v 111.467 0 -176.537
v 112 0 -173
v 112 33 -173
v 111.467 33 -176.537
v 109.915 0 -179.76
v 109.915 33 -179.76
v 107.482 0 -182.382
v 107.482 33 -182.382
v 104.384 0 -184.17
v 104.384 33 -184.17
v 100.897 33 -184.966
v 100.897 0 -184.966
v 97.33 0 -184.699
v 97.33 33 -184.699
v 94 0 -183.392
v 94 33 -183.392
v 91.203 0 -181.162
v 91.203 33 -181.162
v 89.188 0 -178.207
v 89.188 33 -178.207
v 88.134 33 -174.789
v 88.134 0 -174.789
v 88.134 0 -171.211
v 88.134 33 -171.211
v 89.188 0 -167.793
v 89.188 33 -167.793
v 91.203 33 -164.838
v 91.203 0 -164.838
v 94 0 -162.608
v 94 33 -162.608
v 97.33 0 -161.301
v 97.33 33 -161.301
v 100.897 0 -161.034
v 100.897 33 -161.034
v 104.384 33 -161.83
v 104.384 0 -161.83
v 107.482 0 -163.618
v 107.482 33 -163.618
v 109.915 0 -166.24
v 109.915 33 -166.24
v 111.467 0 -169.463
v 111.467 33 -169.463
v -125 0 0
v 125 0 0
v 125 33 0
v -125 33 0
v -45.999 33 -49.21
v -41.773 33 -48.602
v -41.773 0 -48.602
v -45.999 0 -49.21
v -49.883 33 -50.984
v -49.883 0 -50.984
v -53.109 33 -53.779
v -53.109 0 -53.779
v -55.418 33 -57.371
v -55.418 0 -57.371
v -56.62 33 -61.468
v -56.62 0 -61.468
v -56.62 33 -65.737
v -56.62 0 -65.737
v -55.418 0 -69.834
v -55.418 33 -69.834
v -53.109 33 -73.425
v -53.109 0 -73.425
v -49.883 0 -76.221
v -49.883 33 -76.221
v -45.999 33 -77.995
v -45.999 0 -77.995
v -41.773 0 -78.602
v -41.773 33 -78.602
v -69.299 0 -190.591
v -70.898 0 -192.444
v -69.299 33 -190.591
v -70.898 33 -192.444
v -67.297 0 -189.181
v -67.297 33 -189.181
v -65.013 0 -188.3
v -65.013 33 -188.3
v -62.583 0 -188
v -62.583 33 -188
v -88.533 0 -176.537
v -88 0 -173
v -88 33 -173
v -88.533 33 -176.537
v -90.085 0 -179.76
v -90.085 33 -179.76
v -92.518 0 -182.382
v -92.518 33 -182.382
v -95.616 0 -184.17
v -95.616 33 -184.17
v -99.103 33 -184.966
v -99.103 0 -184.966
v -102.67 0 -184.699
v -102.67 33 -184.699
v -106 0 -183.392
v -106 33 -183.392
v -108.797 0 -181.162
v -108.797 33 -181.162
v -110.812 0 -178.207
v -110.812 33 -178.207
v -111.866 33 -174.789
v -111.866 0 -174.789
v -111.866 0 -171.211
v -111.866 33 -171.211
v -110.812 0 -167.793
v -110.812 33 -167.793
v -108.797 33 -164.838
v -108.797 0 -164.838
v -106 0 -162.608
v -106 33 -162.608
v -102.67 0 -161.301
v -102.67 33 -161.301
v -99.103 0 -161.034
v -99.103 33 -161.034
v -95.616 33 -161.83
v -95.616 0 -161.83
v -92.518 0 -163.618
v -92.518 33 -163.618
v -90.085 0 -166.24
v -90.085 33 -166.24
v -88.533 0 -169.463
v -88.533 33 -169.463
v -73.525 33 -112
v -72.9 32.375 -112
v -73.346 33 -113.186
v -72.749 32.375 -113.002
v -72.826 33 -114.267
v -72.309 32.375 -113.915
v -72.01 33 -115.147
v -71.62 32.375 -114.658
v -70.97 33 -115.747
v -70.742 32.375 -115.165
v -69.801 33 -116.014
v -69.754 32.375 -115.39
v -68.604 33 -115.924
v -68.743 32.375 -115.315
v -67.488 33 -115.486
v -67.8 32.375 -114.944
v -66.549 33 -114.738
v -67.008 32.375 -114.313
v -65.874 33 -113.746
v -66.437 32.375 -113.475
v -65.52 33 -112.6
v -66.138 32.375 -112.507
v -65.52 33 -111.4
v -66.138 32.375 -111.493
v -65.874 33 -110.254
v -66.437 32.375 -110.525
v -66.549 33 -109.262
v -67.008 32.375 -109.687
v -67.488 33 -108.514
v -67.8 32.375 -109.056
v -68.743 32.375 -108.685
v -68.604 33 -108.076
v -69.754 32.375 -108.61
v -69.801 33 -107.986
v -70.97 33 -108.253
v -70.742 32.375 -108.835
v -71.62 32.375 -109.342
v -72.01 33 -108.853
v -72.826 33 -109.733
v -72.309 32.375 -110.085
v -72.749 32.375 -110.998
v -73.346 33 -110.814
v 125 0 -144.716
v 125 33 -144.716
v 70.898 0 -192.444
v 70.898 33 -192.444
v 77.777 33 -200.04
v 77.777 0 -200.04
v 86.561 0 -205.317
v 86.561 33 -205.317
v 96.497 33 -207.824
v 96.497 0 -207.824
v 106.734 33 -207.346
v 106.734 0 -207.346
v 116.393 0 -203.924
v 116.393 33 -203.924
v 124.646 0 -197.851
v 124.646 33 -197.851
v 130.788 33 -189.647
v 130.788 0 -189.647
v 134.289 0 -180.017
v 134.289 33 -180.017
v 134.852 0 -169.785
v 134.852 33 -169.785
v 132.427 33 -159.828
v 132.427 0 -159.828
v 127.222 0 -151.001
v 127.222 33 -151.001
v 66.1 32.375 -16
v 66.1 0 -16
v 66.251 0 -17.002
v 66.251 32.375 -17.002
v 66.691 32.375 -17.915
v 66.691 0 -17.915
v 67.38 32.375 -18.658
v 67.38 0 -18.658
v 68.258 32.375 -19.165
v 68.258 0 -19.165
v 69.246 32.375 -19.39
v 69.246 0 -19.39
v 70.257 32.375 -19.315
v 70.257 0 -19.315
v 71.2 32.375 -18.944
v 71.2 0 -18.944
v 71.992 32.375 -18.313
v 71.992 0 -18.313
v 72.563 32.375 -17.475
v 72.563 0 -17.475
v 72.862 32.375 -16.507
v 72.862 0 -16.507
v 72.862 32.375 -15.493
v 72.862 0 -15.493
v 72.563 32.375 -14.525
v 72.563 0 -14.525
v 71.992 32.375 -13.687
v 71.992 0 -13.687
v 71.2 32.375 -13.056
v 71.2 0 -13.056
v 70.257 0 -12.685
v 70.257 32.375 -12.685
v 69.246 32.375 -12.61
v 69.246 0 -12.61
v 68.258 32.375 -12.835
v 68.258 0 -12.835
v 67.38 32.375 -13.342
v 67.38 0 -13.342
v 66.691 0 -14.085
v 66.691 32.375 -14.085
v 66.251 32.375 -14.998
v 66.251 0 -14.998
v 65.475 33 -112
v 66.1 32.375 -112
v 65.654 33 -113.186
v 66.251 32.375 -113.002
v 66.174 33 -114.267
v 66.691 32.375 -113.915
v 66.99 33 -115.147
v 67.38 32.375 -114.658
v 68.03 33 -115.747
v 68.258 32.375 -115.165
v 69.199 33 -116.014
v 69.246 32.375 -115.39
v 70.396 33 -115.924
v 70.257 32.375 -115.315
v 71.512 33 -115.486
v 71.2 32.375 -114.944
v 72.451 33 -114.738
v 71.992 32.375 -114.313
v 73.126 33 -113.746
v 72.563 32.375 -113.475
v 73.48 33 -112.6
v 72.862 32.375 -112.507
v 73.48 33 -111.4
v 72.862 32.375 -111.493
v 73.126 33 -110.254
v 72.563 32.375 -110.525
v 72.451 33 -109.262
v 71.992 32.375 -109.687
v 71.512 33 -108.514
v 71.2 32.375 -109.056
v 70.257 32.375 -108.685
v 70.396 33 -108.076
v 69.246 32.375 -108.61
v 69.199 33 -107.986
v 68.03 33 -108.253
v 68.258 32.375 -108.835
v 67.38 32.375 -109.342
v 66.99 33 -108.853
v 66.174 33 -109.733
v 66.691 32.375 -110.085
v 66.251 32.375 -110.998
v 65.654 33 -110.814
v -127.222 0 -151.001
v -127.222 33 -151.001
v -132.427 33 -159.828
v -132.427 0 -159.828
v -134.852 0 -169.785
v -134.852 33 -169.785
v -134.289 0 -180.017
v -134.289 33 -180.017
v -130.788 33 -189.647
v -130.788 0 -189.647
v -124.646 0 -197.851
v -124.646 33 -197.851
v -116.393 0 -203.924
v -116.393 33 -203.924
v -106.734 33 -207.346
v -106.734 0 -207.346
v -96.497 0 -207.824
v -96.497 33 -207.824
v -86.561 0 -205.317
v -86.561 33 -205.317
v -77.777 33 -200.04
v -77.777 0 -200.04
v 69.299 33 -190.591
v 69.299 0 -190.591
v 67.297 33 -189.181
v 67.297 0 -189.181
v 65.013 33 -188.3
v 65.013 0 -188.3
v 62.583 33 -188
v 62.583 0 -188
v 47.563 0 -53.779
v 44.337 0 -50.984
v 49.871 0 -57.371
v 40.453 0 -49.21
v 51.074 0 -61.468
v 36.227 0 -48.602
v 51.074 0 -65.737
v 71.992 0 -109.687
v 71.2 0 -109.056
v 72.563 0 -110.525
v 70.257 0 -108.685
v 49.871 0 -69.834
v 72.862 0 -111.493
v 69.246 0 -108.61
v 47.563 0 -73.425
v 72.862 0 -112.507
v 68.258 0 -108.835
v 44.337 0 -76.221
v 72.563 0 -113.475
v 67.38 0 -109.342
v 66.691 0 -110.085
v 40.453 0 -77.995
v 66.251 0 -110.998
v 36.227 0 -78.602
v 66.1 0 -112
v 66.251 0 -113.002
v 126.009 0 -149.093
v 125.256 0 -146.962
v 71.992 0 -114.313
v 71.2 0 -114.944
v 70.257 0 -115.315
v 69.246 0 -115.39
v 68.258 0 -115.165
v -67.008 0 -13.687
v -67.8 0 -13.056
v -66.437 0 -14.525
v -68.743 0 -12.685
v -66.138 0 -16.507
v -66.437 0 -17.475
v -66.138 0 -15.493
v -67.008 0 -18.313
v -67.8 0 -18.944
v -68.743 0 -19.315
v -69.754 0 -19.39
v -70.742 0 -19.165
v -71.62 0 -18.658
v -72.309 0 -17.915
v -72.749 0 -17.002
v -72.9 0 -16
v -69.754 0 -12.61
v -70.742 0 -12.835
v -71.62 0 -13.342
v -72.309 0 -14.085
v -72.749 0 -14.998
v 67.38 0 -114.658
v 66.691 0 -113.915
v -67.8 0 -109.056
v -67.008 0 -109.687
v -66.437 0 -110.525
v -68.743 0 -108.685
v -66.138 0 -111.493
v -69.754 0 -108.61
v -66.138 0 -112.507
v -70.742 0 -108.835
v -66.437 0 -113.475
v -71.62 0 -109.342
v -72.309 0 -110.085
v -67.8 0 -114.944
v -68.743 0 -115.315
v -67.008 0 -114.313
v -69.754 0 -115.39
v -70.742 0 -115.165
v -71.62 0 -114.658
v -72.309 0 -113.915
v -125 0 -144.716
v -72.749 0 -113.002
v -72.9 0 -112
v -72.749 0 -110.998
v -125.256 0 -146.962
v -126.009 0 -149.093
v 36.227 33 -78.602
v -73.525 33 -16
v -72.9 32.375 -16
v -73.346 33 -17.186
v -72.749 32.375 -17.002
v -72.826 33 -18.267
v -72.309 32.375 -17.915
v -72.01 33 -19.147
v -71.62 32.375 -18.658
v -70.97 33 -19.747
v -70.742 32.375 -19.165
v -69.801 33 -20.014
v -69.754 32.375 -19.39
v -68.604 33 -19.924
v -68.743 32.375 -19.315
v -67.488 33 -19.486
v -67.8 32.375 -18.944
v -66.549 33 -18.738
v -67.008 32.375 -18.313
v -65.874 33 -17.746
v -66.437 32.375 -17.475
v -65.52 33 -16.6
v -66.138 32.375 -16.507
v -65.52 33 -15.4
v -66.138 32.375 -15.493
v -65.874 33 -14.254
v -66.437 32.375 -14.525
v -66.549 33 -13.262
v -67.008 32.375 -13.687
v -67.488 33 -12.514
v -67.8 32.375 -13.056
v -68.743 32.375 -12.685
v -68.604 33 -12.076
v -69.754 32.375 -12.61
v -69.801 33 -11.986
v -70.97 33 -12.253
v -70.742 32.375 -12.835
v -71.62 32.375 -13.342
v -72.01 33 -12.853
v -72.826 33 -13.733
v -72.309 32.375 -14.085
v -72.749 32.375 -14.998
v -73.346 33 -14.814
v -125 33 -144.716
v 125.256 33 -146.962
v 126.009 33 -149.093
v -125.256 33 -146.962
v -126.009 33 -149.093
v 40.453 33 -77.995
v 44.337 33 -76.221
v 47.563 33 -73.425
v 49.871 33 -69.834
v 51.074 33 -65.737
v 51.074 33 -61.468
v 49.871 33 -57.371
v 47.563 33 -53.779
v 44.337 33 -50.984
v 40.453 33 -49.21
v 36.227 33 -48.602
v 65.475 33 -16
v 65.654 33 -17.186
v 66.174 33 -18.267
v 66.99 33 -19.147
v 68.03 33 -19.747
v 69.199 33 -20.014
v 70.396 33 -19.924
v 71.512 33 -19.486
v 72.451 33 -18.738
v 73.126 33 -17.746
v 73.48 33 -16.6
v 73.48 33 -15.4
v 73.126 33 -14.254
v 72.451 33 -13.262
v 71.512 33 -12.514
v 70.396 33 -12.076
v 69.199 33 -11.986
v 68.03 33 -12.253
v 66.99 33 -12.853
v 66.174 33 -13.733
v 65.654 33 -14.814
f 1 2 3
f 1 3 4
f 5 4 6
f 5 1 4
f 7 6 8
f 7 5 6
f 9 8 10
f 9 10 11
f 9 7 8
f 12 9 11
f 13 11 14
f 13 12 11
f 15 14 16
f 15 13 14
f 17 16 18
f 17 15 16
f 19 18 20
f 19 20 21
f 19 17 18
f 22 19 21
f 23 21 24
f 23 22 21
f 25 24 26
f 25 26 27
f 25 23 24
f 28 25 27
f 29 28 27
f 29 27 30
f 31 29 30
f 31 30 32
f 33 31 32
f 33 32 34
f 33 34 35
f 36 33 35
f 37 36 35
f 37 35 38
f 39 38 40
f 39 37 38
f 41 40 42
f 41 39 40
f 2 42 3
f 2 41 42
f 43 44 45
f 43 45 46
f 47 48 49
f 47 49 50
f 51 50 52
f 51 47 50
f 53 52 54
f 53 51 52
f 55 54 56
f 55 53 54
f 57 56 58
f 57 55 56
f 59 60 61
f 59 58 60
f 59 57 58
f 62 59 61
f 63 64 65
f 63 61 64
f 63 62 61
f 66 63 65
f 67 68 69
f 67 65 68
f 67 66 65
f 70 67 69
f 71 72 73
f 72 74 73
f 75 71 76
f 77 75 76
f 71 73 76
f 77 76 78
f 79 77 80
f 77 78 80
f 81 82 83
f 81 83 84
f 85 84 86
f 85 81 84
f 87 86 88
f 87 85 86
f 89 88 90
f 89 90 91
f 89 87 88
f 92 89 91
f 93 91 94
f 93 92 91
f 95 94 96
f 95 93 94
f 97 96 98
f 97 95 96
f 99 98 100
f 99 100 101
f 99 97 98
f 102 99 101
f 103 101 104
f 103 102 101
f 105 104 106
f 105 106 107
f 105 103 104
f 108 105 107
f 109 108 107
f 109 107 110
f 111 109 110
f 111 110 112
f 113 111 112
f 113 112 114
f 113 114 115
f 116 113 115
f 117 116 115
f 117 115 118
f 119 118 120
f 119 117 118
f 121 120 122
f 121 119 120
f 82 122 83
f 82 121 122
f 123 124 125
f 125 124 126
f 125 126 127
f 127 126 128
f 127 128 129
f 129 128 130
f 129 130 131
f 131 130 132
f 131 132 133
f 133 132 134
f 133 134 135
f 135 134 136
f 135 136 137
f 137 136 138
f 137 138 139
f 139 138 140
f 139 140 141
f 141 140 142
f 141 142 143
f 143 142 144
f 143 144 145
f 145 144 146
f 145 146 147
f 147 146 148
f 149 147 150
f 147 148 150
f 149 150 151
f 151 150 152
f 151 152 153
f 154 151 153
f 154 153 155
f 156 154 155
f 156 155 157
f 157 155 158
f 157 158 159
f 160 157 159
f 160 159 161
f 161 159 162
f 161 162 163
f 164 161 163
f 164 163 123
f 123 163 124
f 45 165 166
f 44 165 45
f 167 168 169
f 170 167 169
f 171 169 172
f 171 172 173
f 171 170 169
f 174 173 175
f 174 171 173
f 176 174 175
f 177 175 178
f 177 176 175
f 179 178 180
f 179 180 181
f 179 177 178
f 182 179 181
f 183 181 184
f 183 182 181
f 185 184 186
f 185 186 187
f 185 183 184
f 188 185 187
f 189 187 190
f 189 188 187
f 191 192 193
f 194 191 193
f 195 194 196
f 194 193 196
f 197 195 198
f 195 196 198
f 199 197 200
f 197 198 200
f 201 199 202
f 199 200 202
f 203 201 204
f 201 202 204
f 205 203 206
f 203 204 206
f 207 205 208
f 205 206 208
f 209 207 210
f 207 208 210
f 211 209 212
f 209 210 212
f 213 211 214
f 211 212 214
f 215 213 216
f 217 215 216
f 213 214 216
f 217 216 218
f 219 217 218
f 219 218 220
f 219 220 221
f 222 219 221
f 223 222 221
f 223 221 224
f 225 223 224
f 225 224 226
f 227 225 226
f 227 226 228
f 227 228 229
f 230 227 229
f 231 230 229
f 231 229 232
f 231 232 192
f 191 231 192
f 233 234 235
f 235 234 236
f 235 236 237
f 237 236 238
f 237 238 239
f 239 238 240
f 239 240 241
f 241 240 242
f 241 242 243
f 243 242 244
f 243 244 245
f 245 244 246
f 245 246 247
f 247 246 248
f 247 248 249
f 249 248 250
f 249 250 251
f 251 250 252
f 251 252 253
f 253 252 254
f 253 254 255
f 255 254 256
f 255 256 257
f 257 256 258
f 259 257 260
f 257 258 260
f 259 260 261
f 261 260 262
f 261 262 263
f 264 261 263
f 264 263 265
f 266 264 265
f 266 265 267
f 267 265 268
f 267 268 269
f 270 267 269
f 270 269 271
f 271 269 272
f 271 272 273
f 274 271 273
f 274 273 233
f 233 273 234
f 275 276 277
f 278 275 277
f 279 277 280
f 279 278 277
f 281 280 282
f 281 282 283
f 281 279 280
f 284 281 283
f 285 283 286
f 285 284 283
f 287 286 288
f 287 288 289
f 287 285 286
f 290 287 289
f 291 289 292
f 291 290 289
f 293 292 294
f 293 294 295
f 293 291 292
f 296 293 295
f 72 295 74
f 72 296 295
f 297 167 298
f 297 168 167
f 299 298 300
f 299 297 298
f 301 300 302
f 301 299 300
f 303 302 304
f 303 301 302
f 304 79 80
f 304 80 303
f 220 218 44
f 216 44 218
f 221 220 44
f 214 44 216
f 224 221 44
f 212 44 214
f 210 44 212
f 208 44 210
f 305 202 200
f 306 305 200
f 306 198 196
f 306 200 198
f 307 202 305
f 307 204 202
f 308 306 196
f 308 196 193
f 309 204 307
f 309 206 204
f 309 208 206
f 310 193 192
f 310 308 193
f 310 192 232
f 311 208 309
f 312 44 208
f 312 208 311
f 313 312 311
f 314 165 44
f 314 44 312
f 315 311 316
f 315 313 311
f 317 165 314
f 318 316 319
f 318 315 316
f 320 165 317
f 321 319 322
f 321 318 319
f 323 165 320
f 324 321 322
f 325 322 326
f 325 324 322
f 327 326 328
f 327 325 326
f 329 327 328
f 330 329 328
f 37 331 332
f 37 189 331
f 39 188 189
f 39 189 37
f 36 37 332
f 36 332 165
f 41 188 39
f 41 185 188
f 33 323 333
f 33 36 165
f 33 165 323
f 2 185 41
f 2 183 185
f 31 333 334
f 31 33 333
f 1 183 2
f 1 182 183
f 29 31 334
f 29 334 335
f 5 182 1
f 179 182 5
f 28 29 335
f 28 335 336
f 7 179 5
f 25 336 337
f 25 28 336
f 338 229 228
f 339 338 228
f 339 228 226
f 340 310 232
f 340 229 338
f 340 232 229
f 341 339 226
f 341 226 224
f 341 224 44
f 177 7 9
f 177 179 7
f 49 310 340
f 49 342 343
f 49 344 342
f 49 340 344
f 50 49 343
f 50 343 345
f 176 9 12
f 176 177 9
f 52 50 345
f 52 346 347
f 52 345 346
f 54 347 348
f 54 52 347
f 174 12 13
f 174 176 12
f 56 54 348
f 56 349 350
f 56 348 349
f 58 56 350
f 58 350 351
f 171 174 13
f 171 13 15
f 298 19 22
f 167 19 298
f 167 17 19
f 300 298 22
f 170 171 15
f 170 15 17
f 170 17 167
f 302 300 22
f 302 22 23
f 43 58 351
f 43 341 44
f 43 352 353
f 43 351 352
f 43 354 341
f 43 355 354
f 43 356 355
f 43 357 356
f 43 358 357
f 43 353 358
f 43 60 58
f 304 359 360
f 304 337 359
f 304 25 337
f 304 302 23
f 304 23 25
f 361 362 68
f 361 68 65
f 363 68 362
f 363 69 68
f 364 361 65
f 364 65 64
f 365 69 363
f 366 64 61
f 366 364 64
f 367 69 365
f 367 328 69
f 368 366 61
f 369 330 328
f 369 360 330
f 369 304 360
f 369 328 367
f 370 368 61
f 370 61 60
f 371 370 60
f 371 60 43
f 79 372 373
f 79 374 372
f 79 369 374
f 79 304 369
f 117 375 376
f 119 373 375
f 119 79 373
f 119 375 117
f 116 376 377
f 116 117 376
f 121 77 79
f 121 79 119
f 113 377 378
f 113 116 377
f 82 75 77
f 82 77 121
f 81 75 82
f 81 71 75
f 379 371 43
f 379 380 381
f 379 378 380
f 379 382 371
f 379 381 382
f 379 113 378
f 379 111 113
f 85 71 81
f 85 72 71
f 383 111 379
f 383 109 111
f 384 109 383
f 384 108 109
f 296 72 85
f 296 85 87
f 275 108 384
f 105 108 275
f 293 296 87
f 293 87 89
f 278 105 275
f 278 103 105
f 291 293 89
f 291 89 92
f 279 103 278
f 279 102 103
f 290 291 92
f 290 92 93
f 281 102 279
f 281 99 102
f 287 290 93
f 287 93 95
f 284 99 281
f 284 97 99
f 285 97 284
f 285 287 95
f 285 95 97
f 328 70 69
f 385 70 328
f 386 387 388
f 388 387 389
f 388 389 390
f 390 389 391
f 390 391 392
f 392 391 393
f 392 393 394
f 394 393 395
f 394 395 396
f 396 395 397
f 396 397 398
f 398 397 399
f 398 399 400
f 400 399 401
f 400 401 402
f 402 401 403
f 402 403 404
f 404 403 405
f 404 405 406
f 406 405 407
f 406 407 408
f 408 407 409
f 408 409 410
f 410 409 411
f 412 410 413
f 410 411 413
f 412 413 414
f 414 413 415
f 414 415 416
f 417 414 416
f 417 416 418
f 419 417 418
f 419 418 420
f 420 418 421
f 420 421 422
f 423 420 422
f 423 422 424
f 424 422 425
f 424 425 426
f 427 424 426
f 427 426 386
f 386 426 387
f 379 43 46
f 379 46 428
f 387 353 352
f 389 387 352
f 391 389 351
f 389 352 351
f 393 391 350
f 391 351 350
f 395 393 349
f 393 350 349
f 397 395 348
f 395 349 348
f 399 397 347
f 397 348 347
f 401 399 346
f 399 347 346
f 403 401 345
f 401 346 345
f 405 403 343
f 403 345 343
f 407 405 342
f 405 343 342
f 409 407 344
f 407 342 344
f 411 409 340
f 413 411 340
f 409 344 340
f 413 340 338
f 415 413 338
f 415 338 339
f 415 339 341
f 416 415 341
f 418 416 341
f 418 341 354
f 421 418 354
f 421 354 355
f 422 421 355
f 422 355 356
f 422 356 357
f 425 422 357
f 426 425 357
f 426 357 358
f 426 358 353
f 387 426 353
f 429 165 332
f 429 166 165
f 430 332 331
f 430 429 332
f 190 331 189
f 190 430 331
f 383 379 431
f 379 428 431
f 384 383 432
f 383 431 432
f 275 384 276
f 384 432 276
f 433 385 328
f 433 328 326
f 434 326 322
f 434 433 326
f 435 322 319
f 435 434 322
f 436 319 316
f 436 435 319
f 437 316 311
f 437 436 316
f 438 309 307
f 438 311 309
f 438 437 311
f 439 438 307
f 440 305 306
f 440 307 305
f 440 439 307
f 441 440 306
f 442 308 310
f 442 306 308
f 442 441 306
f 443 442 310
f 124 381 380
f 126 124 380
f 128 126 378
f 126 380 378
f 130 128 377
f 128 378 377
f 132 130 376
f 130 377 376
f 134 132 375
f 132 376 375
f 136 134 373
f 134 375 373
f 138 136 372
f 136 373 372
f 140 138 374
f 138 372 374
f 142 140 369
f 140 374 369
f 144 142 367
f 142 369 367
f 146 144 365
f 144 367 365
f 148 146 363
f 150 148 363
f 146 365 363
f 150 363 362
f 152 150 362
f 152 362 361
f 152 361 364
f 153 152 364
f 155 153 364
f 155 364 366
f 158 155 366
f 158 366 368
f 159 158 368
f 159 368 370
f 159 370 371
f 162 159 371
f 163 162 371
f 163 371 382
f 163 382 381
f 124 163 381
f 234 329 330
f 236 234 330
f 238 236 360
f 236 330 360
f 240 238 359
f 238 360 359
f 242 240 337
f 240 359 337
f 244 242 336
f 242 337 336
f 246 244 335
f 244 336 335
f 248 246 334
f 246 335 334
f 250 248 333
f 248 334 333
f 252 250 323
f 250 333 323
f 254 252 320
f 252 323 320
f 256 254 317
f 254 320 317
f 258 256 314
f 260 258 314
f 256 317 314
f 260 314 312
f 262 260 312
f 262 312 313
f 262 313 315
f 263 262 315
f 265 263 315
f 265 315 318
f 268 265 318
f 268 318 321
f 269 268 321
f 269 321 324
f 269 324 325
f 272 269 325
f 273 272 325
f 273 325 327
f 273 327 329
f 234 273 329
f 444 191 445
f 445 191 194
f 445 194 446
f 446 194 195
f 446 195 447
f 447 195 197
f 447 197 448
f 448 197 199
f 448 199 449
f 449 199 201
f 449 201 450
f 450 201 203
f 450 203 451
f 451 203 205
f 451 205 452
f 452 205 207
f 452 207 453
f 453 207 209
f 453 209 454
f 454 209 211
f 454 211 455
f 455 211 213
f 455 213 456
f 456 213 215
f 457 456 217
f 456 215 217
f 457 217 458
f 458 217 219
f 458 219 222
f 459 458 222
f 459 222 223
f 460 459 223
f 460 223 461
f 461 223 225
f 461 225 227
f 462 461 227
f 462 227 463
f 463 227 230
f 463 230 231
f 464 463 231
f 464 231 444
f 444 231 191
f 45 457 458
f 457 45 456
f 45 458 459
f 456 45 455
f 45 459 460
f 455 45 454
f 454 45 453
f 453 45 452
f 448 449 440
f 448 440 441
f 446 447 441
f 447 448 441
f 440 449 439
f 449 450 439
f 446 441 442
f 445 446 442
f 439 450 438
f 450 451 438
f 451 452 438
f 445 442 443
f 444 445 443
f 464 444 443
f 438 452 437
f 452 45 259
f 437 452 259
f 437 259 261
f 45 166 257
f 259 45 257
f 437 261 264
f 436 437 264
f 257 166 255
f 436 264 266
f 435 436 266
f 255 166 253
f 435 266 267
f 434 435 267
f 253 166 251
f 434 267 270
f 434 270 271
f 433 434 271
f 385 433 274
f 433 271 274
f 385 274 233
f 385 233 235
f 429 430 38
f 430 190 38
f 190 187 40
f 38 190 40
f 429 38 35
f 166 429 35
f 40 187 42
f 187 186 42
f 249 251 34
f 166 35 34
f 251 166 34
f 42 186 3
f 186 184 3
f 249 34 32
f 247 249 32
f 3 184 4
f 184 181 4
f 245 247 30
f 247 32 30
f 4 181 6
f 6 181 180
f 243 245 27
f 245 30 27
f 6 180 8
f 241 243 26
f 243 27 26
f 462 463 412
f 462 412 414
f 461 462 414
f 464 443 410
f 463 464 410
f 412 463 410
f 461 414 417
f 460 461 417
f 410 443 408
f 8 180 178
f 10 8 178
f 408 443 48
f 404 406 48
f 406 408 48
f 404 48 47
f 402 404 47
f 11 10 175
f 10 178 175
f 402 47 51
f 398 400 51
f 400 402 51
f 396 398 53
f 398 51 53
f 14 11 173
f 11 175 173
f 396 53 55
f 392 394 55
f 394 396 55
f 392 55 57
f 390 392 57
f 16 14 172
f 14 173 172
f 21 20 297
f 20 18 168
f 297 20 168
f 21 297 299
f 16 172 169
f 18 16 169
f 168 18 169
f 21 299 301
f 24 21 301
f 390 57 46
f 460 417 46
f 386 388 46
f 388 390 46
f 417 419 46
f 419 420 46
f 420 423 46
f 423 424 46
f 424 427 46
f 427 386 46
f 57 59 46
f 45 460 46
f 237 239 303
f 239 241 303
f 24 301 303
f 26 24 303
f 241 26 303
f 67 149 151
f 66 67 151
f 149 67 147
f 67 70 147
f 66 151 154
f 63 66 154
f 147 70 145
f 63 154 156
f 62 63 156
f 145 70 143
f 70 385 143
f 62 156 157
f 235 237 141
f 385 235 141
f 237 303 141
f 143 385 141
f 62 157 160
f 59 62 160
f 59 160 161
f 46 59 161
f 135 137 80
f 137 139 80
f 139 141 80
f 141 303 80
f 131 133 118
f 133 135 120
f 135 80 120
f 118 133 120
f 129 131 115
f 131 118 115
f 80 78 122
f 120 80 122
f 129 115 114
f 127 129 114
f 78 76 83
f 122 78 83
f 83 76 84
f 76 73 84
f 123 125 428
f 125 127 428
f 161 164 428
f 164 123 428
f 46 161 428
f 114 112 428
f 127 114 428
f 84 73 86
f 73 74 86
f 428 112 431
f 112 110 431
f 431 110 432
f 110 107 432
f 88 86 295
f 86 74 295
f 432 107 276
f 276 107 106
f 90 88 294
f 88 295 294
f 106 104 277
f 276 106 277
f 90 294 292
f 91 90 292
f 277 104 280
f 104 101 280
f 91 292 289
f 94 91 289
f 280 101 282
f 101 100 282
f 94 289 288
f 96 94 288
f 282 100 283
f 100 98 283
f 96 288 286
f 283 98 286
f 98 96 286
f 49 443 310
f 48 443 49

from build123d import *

# Parameters (mm, degrees)
SKETCH1_R                   = 12
BOSS_EXTRUDE1_DEPTH         = 33
FILLET1_R                   = 10
M8_TAPPED_HOLE1_D           = 6.8
M8_TAPPED_HOLE1_DEPTH       = 33
M8_TAPPED_HOLE1_CSINK_D     = 8.05
M8_TAPPED_HOLE1_CSINK_ANGLE = 90
CUT_EXTRUDE1_REACH          = 35


with BuildPart() as part:
    # Sketch1 → Boss-Extrude1 (new body)
    with BuildSketch(Plane(origin=(0, 0, 0), x_dir=(1, 0, 0), z_dir=(0, 1, 0))):
        with BuildLine():
            Line((125, 0), (-125, 0))
            Line((-125, 0), (-125, 148.505102572))
            ThreePointArc((-125, 148.505102572), (-120.023162168, 201.706671295), (-68.377223398, 188))
            Line((-68.377223398, 188), (68.377223398, 188))
            ThreePointArc((68.377223398, 188), (120.023162168, 201.706671295), (125, 148.505102572))
            Line((125, 148.505102572), (125, 0))
        make_face()
        with Locations((-100, 173)):
            Circle(SKETCH1_R, mode=Mode.SUBTRACT)
        with Locations((100, 173)):
            Circle(SKETCH1_R, mode=Mode.SUBTRACT)
    extrude(amount=BOSS_EXTRUDE1_DEPTH)

    # Fillet1
    fillet1_edges = [part.edges().sort_by_distance(p)[0] for p in [
        (-125, 16.5, -148.505102572),
        (-68.377223398, 16.5, -188),
        (68.377223398, 16.5, -188),
        (125, 16.5, -148.505102572),
    ]]
    fillet(fillet1_edges, radius=FILLET1_R)

    # M8 Tapped Hole1
    with Locations(Plane(origin=(0, 33, 0), x_dir=(1, 0, 0), z_dir=(0, 1, 0))):
        with Locations((-69.5, 112), (69.5, 112), (69.5, 16), (-69.5, 16)):
            CounterSinkHole(M8_TAPPED_HOLE1_D / 2, M8_TAPPED_HOLE1_CSINK_D / 2, depth=M8_TAPPED_HOLE1_DEPTH, counter_sink_angle=M8_TAPPED_HOLE1_CSINK_ANGLE)

    # Sketch4 → Cut-Extrude1 (cut, up to next)
    with BuildSketch(Plane(origin=(0, 33, 0), x_dir=(1, 0, 0), z_dir=(0, 1, 0)), mode=Mode.PRIVATE) as cut_extrude1_sk1:
        with BuildLine():
            Line((-41.773055434, 78.602374467), (36.226944566, 78.602374467))
            ThreePointArc((36.226944566, 78.602374467), (51.226944566, 63.602374467), (36.226944566, 48.602374467))
            Line((36.226944566, 48.602374467), (-41.773055434, 48.602374467))
            ThreePointArc((-41.773055434, 48.602374467), (-56.773055434, 63.602374467), (-41.773055434, 78.602374467))
        make_face()
    cut_extrude1_tool1 = extrude(cut_extrude1_sk1.sketch, amount=-CUT_EXTRUDE1_REACH, mode=Mode.PRIVATE) & part.part
    add(cut_extrude1_tool1.solids().sort_by_distance((-2.773055, 33, -63.602374))[0], mode=Mode.SUBTRACT)


solid = part.part
